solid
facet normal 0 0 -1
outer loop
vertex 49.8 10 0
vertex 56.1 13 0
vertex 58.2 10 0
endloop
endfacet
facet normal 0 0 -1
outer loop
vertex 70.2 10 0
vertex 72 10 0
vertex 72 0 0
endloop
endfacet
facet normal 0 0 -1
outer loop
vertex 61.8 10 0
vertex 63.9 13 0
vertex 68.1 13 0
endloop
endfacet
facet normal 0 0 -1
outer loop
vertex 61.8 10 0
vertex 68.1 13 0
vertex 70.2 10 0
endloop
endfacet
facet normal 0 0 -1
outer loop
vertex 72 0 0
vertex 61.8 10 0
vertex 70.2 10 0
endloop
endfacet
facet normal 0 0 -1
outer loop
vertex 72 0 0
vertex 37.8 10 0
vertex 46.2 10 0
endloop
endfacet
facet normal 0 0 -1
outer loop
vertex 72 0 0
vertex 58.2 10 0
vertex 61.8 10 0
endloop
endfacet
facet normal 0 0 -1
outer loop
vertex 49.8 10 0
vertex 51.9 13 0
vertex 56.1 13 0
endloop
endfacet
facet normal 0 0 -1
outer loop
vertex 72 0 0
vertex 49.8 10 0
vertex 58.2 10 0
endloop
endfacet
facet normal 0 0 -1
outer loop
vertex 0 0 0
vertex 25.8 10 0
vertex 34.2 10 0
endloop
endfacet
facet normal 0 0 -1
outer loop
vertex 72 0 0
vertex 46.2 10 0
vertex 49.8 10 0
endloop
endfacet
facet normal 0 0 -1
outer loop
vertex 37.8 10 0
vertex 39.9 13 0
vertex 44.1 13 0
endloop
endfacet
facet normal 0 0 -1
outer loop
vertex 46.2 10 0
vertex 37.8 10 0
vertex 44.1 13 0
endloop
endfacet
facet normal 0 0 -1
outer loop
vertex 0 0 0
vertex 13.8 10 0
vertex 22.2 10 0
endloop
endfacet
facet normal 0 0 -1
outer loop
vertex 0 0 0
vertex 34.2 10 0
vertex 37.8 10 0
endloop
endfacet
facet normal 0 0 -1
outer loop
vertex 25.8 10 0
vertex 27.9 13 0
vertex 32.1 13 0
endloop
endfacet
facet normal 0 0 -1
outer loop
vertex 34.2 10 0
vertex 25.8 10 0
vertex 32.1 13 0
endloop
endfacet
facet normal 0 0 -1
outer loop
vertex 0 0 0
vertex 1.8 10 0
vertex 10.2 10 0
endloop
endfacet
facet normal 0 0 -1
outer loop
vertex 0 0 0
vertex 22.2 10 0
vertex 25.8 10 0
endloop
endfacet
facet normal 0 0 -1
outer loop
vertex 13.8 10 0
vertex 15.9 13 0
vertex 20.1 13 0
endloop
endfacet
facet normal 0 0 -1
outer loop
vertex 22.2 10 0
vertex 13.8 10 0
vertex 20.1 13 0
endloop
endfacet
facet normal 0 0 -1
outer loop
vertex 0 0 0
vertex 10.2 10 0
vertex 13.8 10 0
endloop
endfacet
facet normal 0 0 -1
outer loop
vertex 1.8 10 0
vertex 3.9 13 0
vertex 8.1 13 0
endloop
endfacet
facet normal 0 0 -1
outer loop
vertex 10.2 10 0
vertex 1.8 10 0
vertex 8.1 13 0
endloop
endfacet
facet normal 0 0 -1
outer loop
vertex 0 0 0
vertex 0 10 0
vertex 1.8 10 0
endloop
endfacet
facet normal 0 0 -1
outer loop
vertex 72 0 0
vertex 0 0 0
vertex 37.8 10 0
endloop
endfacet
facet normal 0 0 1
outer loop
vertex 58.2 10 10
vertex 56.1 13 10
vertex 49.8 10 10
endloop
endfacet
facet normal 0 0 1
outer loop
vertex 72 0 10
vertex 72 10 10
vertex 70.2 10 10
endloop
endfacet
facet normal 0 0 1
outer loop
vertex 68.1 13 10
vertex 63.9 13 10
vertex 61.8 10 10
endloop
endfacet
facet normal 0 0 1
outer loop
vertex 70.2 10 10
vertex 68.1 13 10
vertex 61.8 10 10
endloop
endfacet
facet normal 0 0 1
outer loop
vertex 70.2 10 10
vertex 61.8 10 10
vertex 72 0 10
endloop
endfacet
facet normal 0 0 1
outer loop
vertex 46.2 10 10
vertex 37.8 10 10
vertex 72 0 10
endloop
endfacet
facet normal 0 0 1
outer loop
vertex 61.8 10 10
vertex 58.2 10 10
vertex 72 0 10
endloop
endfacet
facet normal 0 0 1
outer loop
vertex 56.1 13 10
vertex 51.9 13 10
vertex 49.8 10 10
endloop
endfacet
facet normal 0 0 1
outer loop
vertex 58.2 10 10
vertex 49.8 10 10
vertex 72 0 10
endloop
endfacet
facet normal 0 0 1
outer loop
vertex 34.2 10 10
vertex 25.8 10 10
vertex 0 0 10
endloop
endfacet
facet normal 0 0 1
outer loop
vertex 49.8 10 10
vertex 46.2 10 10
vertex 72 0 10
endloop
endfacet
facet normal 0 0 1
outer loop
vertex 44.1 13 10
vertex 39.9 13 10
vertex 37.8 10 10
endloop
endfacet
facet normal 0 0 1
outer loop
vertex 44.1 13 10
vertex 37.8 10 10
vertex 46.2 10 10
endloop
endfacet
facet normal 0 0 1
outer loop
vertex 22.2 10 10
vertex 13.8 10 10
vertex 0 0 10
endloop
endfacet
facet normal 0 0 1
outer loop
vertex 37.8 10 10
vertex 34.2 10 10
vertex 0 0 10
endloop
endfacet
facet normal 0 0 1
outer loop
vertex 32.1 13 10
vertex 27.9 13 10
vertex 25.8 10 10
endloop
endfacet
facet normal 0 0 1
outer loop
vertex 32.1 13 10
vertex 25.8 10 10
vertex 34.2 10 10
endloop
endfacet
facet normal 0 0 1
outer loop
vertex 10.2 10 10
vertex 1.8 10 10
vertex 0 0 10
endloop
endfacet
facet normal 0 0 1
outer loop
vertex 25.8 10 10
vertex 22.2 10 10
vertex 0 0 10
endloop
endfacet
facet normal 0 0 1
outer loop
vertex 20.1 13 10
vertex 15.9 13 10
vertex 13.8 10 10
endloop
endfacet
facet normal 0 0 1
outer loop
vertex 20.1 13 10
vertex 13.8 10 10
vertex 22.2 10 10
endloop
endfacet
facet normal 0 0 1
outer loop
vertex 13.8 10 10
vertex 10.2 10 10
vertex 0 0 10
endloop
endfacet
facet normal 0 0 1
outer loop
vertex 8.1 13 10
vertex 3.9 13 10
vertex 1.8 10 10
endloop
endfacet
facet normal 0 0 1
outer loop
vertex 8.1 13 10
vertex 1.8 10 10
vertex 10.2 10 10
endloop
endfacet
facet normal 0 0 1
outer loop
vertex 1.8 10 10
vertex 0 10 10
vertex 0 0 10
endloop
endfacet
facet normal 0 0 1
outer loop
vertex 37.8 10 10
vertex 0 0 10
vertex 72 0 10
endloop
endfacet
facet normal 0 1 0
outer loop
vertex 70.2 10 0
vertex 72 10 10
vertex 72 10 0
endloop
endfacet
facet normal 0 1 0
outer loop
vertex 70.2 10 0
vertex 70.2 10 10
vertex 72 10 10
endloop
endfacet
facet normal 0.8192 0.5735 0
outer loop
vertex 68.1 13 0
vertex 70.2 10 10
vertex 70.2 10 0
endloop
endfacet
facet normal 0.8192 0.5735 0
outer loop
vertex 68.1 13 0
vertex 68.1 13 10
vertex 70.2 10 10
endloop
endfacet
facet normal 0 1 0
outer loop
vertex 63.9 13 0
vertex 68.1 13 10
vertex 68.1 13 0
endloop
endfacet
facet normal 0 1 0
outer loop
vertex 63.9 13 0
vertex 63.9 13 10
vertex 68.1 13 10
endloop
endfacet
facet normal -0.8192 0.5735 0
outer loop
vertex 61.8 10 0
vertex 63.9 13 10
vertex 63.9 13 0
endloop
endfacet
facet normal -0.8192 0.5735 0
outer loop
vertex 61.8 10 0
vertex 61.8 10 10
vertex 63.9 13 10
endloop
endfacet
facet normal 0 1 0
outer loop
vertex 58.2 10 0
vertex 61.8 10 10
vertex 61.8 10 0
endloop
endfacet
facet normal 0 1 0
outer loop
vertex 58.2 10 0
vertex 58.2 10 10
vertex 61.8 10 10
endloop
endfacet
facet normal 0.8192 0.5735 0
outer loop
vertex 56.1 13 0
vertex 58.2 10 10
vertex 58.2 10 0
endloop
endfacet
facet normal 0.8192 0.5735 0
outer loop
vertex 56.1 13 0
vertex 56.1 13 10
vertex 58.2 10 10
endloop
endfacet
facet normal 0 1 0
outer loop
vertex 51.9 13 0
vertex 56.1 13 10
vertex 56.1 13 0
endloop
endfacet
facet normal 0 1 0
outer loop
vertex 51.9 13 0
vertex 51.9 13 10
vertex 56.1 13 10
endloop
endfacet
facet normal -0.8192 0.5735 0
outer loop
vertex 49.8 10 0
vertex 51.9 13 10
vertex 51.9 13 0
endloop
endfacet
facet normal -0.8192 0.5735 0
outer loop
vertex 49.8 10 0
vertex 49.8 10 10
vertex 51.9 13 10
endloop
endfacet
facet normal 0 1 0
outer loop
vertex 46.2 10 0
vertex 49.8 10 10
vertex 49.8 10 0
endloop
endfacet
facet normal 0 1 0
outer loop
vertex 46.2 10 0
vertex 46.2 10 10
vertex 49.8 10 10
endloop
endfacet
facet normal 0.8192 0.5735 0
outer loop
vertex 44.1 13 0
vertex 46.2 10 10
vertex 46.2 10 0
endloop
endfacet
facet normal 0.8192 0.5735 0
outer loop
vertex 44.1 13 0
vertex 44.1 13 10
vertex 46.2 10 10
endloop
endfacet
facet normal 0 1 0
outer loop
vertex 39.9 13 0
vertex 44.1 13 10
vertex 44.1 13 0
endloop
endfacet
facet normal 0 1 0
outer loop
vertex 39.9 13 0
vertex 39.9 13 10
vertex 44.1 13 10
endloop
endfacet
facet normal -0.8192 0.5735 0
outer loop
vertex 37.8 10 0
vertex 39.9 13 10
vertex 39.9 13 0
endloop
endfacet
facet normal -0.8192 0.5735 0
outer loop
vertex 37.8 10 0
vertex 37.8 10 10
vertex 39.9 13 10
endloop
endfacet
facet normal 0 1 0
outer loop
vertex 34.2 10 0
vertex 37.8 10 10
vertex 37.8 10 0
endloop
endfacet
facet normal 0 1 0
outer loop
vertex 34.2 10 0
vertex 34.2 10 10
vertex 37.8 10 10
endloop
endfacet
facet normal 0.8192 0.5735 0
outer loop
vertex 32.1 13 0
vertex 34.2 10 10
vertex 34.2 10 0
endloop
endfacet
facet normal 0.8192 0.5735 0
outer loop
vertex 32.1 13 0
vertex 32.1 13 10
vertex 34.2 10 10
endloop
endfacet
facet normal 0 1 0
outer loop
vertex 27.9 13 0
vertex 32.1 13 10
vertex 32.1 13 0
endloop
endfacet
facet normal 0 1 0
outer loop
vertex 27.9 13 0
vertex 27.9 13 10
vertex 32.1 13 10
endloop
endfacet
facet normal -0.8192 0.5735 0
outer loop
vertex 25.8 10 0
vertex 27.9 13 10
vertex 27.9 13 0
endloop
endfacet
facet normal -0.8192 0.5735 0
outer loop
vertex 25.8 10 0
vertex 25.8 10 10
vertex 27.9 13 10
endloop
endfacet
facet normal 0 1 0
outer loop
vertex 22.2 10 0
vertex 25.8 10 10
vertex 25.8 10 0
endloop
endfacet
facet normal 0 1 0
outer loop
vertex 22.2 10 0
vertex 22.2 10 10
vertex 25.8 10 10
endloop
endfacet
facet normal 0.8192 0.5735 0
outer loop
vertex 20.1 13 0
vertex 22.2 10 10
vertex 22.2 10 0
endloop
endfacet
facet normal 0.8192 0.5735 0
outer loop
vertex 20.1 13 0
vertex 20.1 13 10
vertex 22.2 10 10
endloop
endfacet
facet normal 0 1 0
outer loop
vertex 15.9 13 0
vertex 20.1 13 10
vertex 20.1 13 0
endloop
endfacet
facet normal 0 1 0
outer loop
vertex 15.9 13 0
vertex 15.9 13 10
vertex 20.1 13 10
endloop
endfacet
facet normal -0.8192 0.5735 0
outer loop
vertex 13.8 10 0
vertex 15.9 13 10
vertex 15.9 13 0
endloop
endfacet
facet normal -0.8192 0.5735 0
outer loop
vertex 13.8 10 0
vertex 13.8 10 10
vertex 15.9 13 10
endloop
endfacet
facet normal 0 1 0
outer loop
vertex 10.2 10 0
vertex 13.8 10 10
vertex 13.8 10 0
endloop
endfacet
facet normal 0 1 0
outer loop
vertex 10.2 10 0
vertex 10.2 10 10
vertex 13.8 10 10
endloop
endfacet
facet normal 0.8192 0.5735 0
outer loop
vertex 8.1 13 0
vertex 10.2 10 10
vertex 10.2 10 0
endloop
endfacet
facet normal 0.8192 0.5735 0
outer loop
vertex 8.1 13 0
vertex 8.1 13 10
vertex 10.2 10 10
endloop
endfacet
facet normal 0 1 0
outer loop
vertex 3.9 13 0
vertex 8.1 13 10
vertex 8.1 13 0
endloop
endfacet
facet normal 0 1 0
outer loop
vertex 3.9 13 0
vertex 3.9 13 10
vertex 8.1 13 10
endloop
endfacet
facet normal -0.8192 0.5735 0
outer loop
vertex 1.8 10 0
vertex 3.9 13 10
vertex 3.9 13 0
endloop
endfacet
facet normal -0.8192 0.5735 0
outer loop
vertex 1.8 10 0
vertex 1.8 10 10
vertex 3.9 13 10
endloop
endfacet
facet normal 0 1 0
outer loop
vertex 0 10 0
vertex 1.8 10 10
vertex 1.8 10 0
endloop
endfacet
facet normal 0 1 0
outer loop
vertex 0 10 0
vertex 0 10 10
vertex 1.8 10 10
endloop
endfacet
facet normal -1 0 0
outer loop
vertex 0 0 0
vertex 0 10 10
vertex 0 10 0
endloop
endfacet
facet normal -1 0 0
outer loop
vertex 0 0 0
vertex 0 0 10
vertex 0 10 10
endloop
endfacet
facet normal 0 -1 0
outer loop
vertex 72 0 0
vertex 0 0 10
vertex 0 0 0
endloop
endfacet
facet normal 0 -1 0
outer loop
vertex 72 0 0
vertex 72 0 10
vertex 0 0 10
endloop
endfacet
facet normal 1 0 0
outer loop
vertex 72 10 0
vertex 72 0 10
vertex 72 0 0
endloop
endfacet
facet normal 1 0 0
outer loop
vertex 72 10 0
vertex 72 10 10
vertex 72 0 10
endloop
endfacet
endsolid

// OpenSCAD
$fn = 32;

// ----------------------------------------------------------------------
// Gear rack: 6 teeth, pitch 12 mm
// ----------------------------------------------------------------------

// --- parameters (mm) ---
teeth = 6;                // number of teeth
pitch = 12;               // tooth pitch, X
root_w = 8.4;             // tooth width at the root
tip_w = 4.2;              // tooth width at the tip
base_h = 10;              // rack body height, Y
tooth_h = 3;              // tooth height above the body
plate_t = 10;             // rack width, Z (extrusion height)

rack_l = teeth * pitch;  // overall length
total_h = base_h + tooth_h;  // overall height

profile = [[0, 0], [72, 0], [72, 10], [70.2, 10], [68.1, 13], [63.9, 13], [61.8, 10], [58.2, 10], [56.1, 13], [51.9, 13], [49.8, 10], [46.2, 10], [44.1, 13], [39.9, 13], [37.8, 10], [34.2, 10], [32.1, 13], [27.9, 13], [25.8, 10], [22.2, 10], [20.1, 13], [15.9, 13], [13.8, 10], [10.2, 10], [8.1, 13], [3.9, 13], [1.8, 10], [0, 10]];  // primary outline, 28 points, counter clockwise

// --- the one profile operation ---
linear_extrude(height = plate_t) polygon(points = profile);
